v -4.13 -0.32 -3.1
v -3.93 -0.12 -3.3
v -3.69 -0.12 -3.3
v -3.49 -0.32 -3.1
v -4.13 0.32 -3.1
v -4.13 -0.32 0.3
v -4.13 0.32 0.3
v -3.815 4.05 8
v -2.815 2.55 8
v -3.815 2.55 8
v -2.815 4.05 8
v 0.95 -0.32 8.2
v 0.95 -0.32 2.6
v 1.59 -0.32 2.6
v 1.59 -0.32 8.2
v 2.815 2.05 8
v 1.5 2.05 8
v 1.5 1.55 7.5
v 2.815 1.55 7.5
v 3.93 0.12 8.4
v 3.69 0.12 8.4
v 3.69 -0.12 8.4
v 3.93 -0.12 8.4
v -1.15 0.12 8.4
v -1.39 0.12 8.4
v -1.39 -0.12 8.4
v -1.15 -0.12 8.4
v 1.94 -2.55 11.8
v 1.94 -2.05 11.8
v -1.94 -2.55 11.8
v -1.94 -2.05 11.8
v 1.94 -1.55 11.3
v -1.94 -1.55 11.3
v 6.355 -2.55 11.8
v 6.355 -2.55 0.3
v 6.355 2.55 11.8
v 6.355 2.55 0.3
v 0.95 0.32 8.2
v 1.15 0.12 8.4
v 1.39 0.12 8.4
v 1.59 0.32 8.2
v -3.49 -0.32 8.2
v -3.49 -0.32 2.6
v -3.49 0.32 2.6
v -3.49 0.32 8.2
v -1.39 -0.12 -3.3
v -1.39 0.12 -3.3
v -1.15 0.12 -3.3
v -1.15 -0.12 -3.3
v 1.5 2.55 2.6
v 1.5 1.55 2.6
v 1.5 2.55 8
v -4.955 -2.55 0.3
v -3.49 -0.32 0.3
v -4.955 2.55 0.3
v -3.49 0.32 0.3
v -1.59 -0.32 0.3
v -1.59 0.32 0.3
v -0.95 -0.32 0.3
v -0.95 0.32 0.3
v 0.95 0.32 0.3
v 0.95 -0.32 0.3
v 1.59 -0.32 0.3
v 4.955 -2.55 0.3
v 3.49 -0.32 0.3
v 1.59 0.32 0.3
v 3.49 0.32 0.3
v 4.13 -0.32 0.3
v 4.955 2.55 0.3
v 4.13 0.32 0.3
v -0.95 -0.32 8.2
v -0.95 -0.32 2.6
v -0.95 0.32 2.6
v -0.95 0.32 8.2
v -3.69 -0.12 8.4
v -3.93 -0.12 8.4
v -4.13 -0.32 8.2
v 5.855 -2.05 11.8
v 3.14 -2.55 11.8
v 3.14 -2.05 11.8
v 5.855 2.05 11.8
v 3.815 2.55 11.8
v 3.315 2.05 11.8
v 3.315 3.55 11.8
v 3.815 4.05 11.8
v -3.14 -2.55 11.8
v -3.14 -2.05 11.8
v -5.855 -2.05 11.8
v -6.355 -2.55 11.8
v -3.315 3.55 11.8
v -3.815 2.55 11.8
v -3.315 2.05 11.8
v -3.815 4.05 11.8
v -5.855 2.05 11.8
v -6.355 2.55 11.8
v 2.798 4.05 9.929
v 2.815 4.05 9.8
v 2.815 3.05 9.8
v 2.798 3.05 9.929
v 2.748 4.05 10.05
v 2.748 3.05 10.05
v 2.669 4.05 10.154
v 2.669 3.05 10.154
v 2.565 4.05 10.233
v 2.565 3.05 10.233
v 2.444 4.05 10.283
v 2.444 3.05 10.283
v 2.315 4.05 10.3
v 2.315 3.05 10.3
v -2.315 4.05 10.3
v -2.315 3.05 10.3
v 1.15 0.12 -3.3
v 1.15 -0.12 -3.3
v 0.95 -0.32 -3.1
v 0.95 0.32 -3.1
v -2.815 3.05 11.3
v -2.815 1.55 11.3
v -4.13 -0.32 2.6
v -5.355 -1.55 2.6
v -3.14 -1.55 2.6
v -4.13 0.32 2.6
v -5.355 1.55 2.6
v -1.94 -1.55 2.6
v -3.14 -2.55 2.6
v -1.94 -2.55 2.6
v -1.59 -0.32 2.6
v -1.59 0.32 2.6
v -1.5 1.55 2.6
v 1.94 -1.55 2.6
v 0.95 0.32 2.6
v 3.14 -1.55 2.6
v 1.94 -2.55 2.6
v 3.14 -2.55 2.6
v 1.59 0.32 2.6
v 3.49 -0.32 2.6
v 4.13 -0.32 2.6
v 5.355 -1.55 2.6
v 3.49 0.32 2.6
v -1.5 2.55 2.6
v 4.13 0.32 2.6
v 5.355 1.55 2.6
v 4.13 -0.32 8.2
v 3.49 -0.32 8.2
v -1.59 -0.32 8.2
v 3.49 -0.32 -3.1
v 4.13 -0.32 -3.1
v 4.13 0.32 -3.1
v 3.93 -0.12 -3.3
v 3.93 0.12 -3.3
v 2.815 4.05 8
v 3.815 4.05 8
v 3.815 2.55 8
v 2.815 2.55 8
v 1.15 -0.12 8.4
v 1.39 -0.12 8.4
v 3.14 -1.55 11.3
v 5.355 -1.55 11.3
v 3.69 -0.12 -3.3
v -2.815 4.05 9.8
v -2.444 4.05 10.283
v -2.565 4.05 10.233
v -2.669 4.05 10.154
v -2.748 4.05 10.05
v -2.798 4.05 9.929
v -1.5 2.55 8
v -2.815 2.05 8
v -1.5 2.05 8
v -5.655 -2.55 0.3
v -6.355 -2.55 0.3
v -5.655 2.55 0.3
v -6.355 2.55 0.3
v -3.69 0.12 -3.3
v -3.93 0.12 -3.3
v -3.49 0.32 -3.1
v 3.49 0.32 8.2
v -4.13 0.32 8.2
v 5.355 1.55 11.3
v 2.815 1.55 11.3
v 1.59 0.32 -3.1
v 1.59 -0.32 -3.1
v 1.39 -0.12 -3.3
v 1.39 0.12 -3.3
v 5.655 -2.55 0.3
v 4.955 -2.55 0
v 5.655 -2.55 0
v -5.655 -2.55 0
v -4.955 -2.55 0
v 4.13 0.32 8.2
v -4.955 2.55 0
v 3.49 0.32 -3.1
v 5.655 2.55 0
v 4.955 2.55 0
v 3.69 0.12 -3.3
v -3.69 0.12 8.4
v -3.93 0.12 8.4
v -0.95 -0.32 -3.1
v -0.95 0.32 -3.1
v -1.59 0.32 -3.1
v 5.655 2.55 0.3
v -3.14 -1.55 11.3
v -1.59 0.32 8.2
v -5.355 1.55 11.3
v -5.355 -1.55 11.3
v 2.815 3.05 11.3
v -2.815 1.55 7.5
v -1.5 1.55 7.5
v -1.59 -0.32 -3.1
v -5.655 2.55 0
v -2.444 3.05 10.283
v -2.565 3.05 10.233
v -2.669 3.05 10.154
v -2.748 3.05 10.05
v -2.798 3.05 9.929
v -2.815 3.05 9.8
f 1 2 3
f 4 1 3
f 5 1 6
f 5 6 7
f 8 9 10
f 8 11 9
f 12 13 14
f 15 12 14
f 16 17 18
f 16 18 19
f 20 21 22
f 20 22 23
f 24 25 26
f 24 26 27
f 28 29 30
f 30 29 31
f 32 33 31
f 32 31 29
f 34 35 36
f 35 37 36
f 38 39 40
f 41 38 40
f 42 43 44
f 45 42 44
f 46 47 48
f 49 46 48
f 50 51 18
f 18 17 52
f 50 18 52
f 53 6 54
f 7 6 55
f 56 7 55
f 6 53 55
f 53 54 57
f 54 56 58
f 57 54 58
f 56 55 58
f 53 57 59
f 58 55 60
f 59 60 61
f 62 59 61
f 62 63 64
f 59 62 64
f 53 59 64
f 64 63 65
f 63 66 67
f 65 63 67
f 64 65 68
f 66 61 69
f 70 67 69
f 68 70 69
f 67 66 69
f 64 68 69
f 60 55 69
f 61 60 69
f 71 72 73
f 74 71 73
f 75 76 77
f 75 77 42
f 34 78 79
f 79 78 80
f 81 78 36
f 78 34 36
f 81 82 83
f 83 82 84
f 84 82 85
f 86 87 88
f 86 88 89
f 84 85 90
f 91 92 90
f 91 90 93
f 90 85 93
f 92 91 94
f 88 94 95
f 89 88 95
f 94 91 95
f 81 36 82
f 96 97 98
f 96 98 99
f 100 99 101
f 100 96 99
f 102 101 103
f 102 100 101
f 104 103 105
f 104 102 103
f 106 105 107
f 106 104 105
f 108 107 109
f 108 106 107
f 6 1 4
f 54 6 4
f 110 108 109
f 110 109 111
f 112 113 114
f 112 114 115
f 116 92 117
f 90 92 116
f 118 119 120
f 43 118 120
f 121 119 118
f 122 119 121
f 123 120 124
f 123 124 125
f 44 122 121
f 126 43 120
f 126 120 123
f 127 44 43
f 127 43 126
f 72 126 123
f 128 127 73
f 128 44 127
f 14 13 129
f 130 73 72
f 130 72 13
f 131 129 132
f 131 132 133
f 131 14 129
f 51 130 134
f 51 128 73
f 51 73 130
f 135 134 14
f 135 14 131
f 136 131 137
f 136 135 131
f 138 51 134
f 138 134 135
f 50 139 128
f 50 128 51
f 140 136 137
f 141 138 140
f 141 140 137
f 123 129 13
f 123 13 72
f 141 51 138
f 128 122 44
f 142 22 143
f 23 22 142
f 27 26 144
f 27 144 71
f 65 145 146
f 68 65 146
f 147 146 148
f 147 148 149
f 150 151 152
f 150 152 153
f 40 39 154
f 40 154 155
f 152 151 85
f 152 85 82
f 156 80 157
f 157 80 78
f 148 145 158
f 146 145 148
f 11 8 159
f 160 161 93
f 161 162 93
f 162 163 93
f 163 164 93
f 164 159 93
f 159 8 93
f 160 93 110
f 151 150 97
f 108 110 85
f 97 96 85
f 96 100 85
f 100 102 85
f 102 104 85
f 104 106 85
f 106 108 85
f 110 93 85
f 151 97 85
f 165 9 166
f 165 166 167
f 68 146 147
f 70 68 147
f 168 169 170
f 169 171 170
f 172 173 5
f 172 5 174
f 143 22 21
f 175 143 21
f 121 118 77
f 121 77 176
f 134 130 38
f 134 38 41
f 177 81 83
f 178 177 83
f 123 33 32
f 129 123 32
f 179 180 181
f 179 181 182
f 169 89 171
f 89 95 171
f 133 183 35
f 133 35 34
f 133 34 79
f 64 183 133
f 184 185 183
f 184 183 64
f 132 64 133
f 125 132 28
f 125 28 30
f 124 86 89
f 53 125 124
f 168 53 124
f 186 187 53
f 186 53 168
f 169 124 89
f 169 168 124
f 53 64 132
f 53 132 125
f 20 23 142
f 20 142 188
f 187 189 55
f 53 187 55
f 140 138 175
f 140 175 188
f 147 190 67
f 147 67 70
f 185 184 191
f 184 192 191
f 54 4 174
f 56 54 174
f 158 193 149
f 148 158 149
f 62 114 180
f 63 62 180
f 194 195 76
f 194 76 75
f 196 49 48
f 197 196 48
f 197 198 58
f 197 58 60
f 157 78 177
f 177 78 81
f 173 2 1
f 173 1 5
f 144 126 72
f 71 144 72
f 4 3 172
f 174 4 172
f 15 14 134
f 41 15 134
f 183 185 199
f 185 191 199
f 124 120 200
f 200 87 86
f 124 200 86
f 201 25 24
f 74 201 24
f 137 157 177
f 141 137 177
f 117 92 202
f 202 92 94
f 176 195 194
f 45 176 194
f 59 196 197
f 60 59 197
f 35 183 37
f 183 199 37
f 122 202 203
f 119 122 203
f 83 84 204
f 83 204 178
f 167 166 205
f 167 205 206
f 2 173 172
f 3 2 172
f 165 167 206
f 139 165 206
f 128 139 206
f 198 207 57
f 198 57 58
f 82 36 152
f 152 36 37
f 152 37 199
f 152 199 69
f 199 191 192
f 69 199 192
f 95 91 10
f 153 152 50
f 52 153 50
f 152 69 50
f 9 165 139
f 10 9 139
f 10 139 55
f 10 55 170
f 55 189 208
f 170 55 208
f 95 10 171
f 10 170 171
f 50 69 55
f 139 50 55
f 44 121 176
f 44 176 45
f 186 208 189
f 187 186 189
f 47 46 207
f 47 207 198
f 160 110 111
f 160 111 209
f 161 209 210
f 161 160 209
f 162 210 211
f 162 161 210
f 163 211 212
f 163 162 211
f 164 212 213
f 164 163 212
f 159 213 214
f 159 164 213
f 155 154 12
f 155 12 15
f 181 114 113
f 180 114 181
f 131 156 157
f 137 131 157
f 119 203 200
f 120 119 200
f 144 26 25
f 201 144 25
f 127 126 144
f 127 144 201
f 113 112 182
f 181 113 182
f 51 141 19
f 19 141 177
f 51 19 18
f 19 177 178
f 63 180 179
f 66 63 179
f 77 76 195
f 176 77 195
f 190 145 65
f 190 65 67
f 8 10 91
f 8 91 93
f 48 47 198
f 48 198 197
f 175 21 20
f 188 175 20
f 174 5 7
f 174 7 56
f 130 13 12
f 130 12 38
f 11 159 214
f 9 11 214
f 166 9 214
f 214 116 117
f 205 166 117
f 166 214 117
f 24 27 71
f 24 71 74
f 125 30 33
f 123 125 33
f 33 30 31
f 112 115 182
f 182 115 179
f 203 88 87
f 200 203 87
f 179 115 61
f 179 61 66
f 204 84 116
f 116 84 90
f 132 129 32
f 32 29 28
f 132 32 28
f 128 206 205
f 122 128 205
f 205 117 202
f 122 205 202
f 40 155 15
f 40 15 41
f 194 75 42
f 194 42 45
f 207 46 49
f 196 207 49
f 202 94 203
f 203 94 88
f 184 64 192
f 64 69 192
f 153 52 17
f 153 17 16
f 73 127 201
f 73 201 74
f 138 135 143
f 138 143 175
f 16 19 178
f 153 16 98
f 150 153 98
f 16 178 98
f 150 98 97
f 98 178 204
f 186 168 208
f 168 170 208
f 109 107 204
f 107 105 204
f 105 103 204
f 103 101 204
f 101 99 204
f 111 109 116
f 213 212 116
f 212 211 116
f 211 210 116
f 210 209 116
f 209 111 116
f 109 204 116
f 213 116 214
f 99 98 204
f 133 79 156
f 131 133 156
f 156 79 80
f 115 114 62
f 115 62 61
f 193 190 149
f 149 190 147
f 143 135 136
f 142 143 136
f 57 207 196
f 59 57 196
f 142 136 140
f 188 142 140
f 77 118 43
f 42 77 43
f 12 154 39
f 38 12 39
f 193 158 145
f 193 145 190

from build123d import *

# Parameters (mm, degrees)
EXTRUDE_1_DEPTH                    = 2.55
CUT_EXTRUDE_1_DEPTH                = 9.2
EXTRUDE_2_DEPTH                    = 3.8
SKETCH_4_W                         = 5.63
SKETCH_4_H                         = 1
CUT_EXTRUDE_2_DEPTH                = 3.8
CUT_EXTRUDE_3_REACH                = 16.939
CHAMFER_1_SIZE                     = 0.5
EXTRUDE_START                      = -3.6
SKETCH_6_W                         = 0.64
SKETCH_6_H                         = 0.64
EXTRUDE_3_DEPTH                    = 11.7
CHAMFER_2_SIZE                     = 0.2
PATTERN_LINEAR_1_COUNT             = 4
PATTERN_LINEAR_1_PITCH             = 2.54
CHAMFER_2_OF_PATTERN_LINEAR_1_SIZE = 0.2


with BuildPart() as part:
    # Эскиз1 → Бобышка-Вытянуть1 (new, symmetric)
    with BuildSketch(Plane(origin=(0, 0, 0), x_dir=(1, 0, 0), z_dir=(0, 1, 0))):
        Polygon((-4.955, -0.3), (4.955, -0.3), (4.955, 0), (5.655, 0), (5.655, -0.3), (6.355, -0.3), (6.355, -11.8), (-6.355, -11.8), (-6.355, -0.3), (-5.655, -0.3), (-5.655, 0), (-4.955, 0), align=None)
    extrude(amount=EXTRUDE_1_DEPTH, both=True)

    # Эскиз2 → Вырез-Вытянуть1 (cut)
    with BuildSketch(Plane.XY.offset(11.8)):
        Polygon((-5.355, 1.55), (-5.355, -1.55), (-3.14, -1.55), (-3.14, -2.55), (-1.94, -2.55), (-1.94, -1.55), (1.94, -1.55), (1.94, -2.55), (3.14, -2.55), (3.14, -1.55), (5.355, -1.55), (5.355, 1.55), (1.5, 1.55), (1.5, 2.55), (-1.5, 2.55), (-1.5, 1.55), align=None)
    extrude(amount=-CUT_EXTRUDE_1_DEPTH, mode=Mode.SUBTRACT)

    # Эскиз3 → Бобышка-Вытянуть2 (add)
    with BuildSketch(Plane.XY.offset(11.8)):
        Polygon((-3.815, 2.55), (-3.815, 4.05), (3.815, 4.05), (3.815, 2.55), (2.815, 2.55), (2.815, 3.05), (-2.815, 3.05), (-2.815, 2.55), align=None)
    extrude(amount=-EXTRUDE_2_DEPTH)

    # Эскиз4 → Вырез-Вытянуть2 (cut)
    with BuildSketch(Plane.XY.offset(11.8)):
        with Locations((0, 2.05)):
            Rectangle(SKETCH_4_W, SKETCH_4_H)
    extrude(amount=-CUT_EXTRUDE_2_DEPTH, mode=Mode.SUBTRACT)

    # Эскиз5 → Вырез-Вытянуть3 (cut, up to next)
    with BuildSketch(Plane(origin=(0, 4.05, 0), x_dir=(1, 0, 0), z_dir=(0, 1, 0)), mode=Mode.PRIVATE) as cut_extrude_3_sk1:
        with BuildLine():
            Line((2.815, -8), (2.815, -9.8))
            ThreePointArc((2.815, -9.8), (2.668553391, -10.153553391), (2.315, -10.3))
            Line((2.315, -10.3), (-2.315, -10.3))
            ThreePointArc((-2.315, -10.3), (-2.668553391, -10.153553391), (-2.815, -9.8))
            Line((-2.815, -9.8), (-2.815, -8))
            Line((-2.815, -8), (2.815, -8))
        make_face()
    cut_extrude_3_tool1 = extrude(cut_extrude_3_sk1.sketch, amount=-CUT_EXTRUDE_3_REACH, mode=Mode.PRIVATE) & part.part
    add(cut_extrude_3_tool1.solids().sort_by_distance((0, 4.05, 9.141324))[0], mode=Mode.SUBTRACT)

    # Фаска1
    chamfer_1_edges = [part.edges().sort_by_distance(p)[0] for p in [
        (2.1575, 1.55, 8),
        (-4.085, 1.55, 11.8),
        (-2.1575, 1.55, 8),
        (-5.355, 0, 11.8),
        (-4.2475, -1.55, 11.8),
        (0, -1.55, 11.8),
        (4.2475, -1.55, 11.8),
        (5.355, 0, 11.8),
        (4.085, 1.55, 11.8),
        (-2.815, 2.3, 11.8),
        (0, 3.05, 11.8),
        (2.815, 2.3, 11.8),
    ]]
    chamfer(chamfer_1_edges, length=CHAMFER_1_SIZE)

    # Эскиз6 → Бобышка-Вытянуть3 (add)
    with BuildSketch(Plane.XY.offset(0.3).offset(EXTRUDE_START)):
        with Locations((3.81, 0)):
            Rectangle(SKETCH_6_W, SKETCH_6_H)
    extrude_3 = extrude(amount=EXTRUDE_3_DEPTH)

    # Фаска2
    chamfer_2_edges = [part.edges().sort_by_distance(p)[0] for p in [
        (3.81, 0.32, 8.4),
        (4.13, 0, 8.4),
        (3.81, -0.32, 8.4),
        (3.49, 0, 8.4),
        (3.49, 0, -3.3),
        (3.81, 0.32, -3.3),
        (4.13, 0, -3.3),
        (3.81, -0.32, -3.3),
    ]]
    chamfer(chamfer_2_edges, length=CHAMFER_2_SIZE)

    # Линейный массив1: Бобышка-Вытянуть3 ×4
    with Locations(*[(-i * PATTERN_LINEAR_1_PITCH, 0, 0) for i in range(1, PATTERN_LINEAR_1_COUNT)]):
        add(extrude_3)

    # Фаска2 of Линейный массив1
    chamfer_2_of_pattern_linear_1_edges = [part.edges().sort_by_distance(p)[0] for p in [
        (1.27, 0.32, 8.4),
        (1.59, 0, 8.4),
        (1.27, -0.32, 8.4),
        (0.95, 0, 8.4),
        (0.95, 0, -3.3),
        (1.27, 0.32, -3.3),
        (1.59, 0, -3.3),
        (1.27, -0.32, -3.3),
        (-1.27, 0.32, 8.4),
        (-0.95, 0, 8.4),
        (-1.27, -0.32, 8.4),
        (-1.59, 0, 8.4),
        (-1.59, 0, -3.3),
        (-1.27, 0.32, -3.3),
        (-0.95, 0, -3.3),
        (-1.27, -0.32, -3.3),
        (-3.81, 0.32, 8.4),
        (-3.49, 0, 8.4),
        (-3.81, -0.32, 8.4),
        (-4.13, 0, 8.4),
        (-4.13, 0, -3.3),
        (-3.81, 0.32, -3.3),
        (-3.49, 0, -3.3),
        (-3.81, -0.32, -3.3),
    ]]
    chamfer(chamfer_2_of_pattern_linear_1_edges, length=CHAMFER_2_OF_PATTERN_LINEAR_1_SIZE)


solid = part.part
